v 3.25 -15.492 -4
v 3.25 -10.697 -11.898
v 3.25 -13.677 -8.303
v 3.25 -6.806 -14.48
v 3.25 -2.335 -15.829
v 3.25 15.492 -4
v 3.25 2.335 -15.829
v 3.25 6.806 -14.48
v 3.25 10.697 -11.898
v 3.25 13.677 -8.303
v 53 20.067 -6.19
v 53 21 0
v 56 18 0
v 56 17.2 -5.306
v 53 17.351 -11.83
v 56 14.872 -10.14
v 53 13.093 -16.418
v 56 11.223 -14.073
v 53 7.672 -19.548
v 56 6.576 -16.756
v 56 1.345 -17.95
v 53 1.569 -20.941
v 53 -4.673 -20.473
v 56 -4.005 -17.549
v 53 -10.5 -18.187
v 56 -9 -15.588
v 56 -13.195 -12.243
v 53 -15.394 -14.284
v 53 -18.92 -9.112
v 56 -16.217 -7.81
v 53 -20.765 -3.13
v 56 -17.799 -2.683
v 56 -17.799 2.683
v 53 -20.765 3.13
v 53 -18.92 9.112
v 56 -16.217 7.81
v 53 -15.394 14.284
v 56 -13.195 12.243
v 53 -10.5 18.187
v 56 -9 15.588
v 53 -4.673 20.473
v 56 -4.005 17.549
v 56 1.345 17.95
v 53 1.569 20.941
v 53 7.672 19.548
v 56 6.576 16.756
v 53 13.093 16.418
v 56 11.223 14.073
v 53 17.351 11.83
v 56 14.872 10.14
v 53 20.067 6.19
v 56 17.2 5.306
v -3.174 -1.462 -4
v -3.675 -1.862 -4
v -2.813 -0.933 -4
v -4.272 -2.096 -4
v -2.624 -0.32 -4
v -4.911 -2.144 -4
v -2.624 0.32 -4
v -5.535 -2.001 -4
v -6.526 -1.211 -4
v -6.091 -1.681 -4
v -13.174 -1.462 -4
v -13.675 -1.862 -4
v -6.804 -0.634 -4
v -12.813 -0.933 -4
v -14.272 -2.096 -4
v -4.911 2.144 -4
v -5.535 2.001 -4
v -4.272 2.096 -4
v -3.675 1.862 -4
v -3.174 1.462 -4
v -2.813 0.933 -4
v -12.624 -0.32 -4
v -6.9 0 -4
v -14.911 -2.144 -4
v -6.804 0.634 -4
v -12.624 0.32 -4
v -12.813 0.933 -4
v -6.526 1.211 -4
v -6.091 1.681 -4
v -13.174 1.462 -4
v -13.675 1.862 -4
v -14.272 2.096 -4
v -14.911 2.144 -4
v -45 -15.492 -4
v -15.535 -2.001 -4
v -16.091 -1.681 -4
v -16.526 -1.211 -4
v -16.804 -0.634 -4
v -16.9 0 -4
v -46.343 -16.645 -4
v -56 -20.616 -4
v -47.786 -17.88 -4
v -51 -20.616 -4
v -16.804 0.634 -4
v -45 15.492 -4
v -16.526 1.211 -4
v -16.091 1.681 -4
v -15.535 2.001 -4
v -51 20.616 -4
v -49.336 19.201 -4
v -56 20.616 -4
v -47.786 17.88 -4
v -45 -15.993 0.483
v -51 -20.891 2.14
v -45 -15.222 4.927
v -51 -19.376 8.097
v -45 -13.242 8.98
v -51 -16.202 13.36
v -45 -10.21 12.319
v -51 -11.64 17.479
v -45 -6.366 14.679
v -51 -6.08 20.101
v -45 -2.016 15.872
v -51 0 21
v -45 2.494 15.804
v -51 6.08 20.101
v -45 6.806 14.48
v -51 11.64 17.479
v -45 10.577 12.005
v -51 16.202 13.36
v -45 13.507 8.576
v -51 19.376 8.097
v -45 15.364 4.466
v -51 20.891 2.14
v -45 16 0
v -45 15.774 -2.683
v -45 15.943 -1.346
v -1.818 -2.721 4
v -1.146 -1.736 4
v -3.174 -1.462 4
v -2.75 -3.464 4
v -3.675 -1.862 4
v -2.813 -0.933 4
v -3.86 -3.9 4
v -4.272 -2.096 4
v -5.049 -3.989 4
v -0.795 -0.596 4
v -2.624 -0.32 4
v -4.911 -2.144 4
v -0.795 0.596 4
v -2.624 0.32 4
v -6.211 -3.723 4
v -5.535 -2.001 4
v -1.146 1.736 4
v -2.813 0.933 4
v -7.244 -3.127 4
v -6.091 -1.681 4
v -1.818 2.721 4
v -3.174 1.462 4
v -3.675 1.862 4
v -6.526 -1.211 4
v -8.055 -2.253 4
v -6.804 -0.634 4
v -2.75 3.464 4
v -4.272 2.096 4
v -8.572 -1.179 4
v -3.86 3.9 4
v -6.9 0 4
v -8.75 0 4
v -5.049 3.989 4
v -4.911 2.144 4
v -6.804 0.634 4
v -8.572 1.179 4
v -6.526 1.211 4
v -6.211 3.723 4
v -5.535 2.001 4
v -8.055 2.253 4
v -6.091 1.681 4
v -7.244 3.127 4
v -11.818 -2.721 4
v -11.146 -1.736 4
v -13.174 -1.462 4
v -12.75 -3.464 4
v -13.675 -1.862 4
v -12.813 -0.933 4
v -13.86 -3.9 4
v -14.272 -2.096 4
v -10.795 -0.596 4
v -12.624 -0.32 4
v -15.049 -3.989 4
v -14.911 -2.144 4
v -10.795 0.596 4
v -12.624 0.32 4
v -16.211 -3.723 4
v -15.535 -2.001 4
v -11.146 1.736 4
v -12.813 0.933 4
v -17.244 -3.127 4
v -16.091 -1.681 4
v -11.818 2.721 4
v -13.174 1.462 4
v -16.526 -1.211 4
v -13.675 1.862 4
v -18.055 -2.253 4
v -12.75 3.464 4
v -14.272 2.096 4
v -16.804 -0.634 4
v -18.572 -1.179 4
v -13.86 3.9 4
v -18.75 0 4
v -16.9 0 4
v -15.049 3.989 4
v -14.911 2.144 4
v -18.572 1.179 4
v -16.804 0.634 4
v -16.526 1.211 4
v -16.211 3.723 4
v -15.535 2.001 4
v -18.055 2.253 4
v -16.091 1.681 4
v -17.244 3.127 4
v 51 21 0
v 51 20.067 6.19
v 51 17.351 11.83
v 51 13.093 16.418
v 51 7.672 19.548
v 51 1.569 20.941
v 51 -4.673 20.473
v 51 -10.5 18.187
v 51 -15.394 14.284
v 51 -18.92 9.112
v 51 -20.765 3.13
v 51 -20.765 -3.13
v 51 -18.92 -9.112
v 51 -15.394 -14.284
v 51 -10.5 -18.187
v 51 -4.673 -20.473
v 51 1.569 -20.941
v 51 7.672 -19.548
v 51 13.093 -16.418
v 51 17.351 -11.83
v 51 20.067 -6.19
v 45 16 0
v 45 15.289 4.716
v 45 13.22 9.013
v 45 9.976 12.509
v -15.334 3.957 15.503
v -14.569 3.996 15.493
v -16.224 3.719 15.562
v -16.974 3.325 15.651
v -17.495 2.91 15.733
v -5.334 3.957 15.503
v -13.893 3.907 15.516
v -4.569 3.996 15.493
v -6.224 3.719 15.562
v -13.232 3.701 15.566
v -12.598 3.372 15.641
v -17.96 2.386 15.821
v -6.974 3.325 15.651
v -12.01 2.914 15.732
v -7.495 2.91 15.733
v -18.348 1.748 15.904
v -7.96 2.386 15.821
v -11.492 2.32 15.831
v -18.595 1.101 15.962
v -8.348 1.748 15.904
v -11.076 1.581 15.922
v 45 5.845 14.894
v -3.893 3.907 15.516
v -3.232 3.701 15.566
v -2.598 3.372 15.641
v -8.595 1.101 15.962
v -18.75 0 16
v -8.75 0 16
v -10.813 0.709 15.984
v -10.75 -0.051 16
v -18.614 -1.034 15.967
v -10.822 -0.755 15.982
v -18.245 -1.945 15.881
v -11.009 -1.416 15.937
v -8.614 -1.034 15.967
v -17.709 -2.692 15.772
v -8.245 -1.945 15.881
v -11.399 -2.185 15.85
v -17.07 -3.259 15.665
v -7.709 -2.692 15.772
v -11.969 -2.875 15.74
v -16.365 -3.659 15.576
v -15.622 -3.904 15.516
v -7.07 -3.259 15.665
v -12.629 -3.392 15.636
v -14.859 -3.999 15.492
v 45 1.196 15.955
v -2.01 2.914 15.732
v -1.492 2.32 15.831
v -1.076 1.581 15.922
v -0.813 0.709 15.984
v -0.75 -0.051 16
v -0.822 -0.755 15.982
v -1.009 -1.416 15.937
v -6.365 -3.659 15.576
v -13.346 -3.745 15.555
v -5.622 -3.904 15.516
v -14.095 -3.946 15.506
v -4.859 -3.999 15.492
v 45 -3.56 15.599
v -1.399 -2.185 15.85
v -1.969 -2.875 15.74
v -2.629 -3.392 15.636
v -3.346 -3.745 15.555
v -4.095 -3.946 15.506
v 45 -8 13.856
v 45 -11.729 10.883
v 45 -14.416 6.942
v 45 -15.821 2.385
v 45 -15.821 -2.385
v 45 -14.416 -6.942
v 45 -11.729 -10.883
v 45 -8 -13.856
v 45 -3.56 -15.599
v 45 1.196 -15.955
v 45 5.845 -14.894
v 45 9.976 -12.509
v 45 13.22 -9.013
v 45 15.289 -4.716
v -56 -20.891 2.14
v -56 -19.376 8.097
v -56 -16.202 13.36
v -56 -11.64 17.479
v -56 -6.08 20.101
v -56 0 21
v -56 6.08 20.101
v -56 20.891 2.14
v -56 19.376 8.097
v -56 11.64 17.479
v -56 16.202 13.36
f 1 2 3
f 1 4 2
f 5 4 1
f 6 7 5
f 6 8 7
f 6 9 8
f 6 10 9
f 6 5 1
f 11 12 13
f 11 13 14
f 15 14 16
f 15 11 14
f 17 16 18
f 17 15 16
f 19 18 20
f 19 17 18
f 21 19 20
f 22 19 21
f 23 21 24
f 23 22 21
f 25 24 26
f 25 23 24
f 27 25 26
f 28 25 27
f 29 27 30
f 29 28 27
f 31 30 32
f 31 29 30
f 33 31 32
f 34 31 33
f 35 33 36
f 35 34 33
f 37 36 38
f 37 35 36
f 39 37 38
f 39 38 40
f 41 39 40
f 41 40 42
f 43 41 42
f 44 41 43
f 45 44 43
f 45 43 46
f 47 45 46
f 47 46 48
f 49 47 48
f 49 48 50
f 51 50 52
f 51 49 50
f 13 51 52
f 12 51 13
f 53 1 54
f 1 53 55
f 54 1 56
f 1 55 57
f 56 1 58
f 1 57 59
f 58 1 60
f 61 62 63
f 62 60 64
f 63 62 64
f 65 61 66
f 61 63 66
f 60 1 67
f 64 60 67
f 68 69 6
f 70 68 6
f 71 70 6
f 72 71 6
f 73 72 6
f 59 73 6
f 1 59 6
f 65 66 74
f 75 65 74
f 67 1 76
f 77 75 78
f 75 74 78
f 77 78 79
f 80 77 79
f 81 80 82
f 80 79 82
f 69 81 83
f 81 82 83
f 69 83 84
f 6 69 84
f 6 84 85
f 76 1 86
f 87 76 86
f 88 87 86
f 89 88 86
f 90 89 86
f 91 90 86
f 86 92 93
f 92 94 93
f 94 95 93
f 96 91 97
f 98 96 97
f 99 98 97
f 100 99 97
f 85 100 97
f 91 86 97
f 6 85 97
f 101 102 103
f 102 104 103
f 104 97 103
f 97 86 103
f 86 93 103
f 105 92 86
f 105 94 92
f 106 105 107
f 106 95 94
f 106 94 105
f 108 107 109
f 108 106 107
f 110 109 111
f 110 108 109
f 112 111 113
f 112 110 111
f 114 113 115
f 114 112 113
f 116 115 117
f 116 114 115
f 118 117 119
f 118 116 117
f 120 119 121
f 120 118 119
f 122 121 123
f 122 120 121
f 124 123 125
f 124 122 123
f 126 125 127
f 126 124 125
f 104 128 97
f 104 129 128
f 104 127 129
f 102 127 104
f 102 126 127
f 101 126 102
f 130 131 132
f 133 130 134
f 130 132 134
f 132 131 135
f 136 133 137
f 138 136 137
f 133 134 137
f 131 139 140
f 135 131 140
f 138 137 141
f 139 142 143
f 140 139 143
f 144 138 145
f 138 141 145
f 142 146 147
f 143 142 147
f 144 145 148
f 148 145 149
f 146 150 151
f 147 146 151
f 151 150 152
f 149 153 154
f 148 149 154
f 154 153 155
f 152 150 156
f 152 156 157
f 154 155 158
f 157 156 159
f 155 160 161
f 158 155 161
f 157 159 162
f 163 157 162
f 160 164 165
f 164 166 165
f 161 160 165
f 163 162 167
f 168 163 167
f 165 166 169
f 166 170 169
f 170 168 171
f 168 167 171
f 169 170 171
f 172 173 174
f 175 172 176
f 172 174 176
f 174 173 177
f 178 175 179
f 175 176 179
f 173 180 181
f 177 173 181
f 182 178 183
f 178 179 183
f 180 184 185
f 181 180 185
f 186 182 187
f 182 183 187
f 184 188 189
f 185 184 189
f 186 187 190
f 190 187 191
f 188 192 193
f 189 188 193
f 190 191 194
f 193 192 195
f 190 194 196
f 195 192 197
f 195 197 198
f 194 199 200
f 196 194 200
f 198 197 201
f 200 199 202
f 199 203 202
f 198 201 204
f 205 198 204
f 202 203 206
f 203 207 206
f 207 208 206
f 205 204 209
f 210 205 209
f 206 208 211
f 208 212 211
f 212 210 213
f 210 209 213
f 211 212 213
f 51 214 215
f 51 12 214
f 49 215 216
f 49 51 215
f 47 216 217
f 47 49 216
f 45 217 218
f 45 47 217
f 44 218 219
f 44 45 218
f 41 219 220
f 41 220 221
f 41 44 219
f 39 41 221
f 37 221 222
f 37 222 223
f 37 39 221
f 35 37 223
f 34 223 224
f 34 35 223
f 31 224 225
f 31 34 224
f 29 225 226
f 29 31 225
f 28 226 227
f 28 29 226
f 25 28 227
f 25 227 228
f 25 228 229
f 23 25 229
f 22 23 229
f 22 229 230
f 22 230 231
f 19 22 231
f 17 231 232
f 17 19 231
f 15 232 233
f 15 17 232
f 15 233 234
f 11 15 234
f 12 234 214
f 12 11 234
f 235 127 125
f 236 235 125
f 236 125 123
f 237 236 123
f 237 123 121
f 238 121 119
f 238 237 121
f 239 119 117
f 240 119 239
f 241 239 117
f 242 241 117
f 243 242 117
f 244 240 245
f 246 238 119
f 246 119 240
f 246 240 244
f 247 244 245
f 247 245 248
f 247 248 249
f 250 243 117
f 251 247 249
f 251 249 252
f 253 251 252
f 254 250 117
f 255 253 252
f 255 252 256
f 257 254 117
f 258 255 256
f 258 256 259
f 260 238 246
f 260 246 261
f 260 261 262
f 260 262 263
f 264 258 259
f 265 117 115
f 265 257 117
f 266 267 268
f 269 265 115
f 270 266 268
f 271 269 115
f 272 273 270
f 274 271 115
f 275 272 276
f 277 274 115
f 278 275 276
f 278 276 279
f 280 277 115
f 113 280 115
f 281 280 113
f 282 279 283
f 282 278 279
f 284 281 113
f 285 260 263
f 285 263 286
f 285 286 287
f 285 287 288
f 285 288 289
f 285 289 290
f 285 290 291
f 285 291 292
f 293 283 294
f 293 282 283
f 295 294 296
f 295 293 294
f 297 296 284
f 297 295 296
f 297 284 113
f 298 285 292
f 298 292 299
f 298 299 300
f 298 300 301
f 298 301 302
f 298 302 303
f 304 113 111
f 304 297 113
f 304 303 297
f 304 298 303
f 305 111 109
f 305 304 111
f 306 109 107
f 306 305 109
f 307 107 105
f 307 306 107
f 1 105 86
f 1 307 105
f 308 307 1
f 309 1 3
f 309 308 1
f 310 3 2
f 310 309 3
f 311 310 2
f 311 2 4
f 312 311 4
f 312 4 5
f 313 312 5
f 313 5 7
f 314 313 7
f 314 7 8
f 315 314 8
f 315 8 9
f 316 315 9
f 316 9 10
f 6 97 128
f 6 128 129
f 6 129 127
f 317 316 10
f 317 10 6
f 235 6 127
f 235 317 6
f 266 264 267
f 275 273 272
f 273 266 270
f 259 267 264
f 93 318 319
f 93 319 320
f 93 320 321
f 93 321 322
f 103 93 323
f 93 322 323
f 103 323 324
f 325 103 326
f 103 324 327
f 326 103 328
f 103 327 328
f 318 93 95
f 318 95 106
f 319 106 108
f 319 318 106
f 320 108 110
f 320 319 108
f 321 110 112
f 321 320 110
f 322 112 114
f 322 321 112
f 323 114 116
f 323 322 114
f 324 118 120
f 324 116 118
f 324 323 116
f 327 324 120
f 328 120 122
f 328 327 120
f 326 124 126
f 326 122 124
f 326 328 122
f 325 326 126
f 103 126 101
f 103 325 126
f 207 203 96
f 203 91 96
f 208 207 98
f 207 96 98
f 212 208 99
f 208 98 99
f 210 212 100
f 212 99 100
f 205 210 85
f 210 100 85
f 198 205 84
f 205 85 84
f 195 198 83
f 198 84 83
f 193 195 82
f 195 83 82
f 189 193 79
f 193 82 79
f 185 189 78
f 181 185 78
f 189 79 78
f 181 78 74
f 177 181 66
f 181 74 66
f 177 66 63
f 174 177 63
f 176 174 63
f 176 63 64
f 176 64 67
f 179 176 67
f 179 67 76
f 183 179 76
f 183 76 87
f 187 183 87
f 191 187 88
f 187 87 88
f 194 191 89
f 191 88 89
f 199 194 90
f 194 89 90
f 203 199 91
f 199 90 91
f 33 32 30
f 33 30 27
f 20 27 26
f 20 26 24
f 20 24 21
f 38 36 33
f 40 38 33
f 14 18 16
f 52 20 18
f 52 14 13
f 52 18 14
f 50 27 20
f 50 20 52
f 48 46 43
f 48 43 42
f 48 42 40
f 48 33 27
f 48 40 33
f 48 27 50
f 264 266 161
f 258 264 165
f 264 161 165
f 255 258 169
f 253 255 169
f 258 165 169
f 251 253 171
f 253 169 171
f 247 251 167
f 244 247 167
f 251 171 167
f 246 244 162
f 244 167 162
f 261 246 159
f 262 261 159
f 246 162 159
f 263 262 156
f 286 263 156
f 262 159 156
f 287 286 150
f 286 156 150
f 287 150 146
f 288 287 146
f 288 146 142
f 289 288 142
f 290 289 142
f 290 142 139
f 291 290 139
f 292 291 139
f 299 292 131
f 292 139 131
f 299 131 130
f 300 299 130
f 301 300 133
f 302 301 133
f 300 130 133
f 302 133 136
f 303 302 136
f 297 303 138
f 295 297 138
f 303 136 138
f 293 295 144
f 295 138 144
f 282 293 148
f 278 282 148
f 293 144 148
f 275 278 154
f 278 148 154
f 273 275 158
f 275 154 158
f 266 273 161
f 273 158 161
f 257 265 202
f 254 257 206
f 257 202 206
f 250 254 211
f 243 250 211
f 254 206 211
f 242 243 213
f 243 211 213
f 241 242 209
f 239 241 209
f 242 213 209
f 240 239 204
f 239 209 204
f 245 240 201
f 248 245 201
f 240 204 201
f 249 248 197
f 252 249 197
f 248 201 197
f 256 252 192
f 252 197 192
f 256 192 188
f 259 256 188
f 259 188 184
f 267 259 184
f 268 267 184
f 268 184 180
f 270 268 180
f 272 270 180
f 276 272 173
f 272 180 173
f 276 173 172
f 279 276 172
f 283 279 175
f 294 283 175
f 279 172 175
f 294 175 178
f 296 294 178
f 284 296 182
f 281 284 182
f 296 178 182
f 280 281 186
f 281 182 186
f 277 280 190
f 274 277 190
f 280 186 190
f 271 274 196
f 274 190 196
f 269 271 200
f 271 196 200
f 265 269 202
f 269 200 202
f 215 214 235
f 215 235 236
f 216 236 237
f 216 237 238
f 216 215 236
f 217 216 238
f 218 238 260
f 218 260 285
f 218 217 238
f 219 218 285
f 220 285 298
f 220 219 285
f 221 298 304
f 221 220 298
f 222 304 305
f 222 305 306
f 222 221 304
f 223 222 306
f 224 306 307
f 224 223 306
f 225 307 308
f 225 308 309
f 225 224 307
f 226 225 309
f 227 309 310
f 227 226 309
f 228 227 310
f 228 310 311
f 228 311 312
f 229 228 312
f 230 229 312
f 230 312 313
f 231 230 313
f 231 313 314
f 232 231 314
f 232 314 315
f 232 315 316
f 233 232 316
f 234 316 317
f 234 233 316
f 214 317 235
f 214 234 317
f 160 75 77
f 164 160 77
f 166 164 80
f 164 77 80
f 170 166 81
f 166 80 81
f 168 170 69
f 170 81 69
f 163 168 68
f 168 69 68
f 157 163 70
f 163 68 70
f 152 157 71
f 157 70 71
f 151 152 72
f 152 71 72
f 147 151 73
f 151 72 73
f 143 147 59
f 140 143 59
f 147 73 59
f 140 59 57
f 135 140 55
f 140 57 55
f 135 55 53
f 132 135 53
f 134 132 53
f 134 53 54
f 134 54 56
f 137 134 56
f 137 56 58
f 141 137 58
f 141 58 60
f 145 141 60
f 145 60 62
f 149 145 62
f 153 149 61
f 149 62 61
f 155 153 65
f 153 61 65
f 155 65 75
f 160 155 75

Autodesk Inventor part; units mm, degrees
ref_plane "YZ Plane" through (0, 0, 0) normal (1, 0, 0) x (0, 1, 0)
ref_plane "XZ Plane" through (0, 0, 0) normal (0, 1, 0) x (-1, 0, 0)
sketch "Sketch1" plane through (0, 0, 0) normal (0, 0, 1) x (1, 0, 0)
  line L0 (0, -4.2) -> (0, 25.2) construction
  line L1 (-78.4, 0) -> (78.4, 0) construction
  line L2 (-45, 16) -> (45, 16)
  line L3 (45, 16) -> (45, 0)
  line L4 (45, 0) -> (-45, 0)
  line L5 (-45, 0) -> (-45, 16)
  line L6 (-45, 0) -> (-51, 0)
  line L7 (-51, 0) -> (-51, 21)
  line L8 (-51, 21) -> (-45, 16)
  line L9 (-51, 21) -> (-56, 21)
  line L10 (-56, 21) -> (-56, 0)
  line L11 (-56, 0) -> (-51, 0)
  line L12 (-51, 0) -> (-51, 21)
  line L13 (45, 0) -> (45, 16)
  line L14 (45, 0) -> (51, 0)
  line L15 (51, 0) -> (51, 21)
  line L16 (51, 21) -> (45, 16)
  line L17 (51, 21) -> (56, 21)
  line L18 (56, 21) -> (56, 0)
  line L19 (56, 0) -> (51, 0)
  line L20 (51, 0) -> (51, 21)
  point P0 (0, 0)
  dimension "d1" = 90
  dimension "d3" = 6
  dimension "d4" = 5
  dimension "d6" = 5
  dimension "d7" = 16
  dimension "d9" = 11
revolve "Revolution1" add sketch "Sketch1" angle 360 about axis through (-10, 0, 0) along (1, 0, 0)
sketch "Sketch2" plane through (-56, 0, 0) normal (-1, 0, 0) x (0, 0, 1)
  line L0 (-30.6, 0) -> (29.6, 0) construction
  line L1 (-4, 20.6155) -> (-21, 20.6155)
  line L2 (-21, 20.6155) -> (-21, -20.6155)
  line L3 (-21, -20.6155) -> (-4, -20.6155)
  line L4 (-4, -20.6155) -> (-4, 20.6155)
  circle A0 centre (0, 0) radius 16 construction
  circle A1 centre (0, 0) radius 16 construction
  circle A2 centre (0, 0) radius 16 construction
  line L5 (0, 0) -> (16, 0) construction
  circle A3 centre (0, 0) radius 16 construction
  circle A4 centre (0, 0) radius 21 construction
  dimension "d8" = 20
extrude "Extrusion1" cut sketch "Sketch2" against normal blind 59.25
sketch "Sketch3" plane through (-56, -20.6155, -4) normal (0, 0, -1) x (-1, 0, 0)
  line L0 (0, 41.6155) -> (0, -0.3845) construction
  line L1 (0, 20.6155) -> (-59.25, 20.6155) construction
  line L2 (-59.25, 36.1075) -> (-59.25, 5.1236) construction
  circle A0 centre (-41.25, 20.6155) radius 2.15
  circle A1 centre (-51.25, 20.6155) radius 2.15
  line L3 (-41.25, 20.6155) -> (-51.25, 20.6155) construction
  line L4 (-11, 36.6155) -> (-11, 4.6155) construction
  line L5 (-11, 4.6155) -> (-11, 36.6155) construction
  line L6 (-5, 41.6155) -> (-11, 36.6155) construction
  line L7 (-11, 5.1236) -> (-59.25, 5.1236) construction
  line L8 (-56.25, 5.1236) -> (-56.25, 36.1075) construction
  line L9 (-59.25, 36.1075) -> (-11, 36.1075) construction
  point P0 (-56, 20.6155)
  point P1 (0, 41.2311)
  point P2 (0, 0)
  point P3 (-46.25, 20.6155)
  dimension "d14" = 4.3
  dimension "d16" = 10
  dimension "d18" = 4.3
  dimension "d21" = 3
  dimension "d22" = 10
extrude "Extrusion2" cut sketch "Sketch3" against normal up to surface
ref_plane "Work Plane1" through (-56, -20.6155, 4) normal (0, 0, -1) x (-1, 0, 0)
sketch "Sketch4" plane through (-56, -20.6155, 4) normal (0, 0, -1) x (-1, 0, 0)
  circle A0 centre (-41.25, 20.6155) radius 2.15 projected
  circle A1 centre (-41.25, 20.6155) radius 4
  circle A2 centre (-51.25, 20.6155) radius 2.15 projected
  circle A3 centre (-51.25, 20.6155) radius 4
  point P0 (-56, 20.6155)
  dimension "d24" = 8
  dimension "d25" = 8
extrude "Extrusion3" cut sketch "Sketch4" against normal up to surface contours A0 | A1 | A2 | A3
chamfer "Chamfer1" distance 3 angle 45 1 edges at (56, -21, 0)
equation "\"d8\" = ShaftH"
equation "\"d10\" = d92 + d9 + LCClearance"
equation "\"d21\" = LCClearance"
equation "\"d26\" = d92 + d9 + LCClearance"
equation "\"ShaftH\" = 20"
equation "\"WallT\" = 3"
equation "\"SpoolOffset\" = 8"
equation "\"BottomT\" = 4"
equation "\"WallH\" = 45"
equation "\"ShaftL\" = 81"
equation "\"LCClearance\" = 3"
equation "\"d92\" = 45.25"
properties part number "FS_ShaftV2"
